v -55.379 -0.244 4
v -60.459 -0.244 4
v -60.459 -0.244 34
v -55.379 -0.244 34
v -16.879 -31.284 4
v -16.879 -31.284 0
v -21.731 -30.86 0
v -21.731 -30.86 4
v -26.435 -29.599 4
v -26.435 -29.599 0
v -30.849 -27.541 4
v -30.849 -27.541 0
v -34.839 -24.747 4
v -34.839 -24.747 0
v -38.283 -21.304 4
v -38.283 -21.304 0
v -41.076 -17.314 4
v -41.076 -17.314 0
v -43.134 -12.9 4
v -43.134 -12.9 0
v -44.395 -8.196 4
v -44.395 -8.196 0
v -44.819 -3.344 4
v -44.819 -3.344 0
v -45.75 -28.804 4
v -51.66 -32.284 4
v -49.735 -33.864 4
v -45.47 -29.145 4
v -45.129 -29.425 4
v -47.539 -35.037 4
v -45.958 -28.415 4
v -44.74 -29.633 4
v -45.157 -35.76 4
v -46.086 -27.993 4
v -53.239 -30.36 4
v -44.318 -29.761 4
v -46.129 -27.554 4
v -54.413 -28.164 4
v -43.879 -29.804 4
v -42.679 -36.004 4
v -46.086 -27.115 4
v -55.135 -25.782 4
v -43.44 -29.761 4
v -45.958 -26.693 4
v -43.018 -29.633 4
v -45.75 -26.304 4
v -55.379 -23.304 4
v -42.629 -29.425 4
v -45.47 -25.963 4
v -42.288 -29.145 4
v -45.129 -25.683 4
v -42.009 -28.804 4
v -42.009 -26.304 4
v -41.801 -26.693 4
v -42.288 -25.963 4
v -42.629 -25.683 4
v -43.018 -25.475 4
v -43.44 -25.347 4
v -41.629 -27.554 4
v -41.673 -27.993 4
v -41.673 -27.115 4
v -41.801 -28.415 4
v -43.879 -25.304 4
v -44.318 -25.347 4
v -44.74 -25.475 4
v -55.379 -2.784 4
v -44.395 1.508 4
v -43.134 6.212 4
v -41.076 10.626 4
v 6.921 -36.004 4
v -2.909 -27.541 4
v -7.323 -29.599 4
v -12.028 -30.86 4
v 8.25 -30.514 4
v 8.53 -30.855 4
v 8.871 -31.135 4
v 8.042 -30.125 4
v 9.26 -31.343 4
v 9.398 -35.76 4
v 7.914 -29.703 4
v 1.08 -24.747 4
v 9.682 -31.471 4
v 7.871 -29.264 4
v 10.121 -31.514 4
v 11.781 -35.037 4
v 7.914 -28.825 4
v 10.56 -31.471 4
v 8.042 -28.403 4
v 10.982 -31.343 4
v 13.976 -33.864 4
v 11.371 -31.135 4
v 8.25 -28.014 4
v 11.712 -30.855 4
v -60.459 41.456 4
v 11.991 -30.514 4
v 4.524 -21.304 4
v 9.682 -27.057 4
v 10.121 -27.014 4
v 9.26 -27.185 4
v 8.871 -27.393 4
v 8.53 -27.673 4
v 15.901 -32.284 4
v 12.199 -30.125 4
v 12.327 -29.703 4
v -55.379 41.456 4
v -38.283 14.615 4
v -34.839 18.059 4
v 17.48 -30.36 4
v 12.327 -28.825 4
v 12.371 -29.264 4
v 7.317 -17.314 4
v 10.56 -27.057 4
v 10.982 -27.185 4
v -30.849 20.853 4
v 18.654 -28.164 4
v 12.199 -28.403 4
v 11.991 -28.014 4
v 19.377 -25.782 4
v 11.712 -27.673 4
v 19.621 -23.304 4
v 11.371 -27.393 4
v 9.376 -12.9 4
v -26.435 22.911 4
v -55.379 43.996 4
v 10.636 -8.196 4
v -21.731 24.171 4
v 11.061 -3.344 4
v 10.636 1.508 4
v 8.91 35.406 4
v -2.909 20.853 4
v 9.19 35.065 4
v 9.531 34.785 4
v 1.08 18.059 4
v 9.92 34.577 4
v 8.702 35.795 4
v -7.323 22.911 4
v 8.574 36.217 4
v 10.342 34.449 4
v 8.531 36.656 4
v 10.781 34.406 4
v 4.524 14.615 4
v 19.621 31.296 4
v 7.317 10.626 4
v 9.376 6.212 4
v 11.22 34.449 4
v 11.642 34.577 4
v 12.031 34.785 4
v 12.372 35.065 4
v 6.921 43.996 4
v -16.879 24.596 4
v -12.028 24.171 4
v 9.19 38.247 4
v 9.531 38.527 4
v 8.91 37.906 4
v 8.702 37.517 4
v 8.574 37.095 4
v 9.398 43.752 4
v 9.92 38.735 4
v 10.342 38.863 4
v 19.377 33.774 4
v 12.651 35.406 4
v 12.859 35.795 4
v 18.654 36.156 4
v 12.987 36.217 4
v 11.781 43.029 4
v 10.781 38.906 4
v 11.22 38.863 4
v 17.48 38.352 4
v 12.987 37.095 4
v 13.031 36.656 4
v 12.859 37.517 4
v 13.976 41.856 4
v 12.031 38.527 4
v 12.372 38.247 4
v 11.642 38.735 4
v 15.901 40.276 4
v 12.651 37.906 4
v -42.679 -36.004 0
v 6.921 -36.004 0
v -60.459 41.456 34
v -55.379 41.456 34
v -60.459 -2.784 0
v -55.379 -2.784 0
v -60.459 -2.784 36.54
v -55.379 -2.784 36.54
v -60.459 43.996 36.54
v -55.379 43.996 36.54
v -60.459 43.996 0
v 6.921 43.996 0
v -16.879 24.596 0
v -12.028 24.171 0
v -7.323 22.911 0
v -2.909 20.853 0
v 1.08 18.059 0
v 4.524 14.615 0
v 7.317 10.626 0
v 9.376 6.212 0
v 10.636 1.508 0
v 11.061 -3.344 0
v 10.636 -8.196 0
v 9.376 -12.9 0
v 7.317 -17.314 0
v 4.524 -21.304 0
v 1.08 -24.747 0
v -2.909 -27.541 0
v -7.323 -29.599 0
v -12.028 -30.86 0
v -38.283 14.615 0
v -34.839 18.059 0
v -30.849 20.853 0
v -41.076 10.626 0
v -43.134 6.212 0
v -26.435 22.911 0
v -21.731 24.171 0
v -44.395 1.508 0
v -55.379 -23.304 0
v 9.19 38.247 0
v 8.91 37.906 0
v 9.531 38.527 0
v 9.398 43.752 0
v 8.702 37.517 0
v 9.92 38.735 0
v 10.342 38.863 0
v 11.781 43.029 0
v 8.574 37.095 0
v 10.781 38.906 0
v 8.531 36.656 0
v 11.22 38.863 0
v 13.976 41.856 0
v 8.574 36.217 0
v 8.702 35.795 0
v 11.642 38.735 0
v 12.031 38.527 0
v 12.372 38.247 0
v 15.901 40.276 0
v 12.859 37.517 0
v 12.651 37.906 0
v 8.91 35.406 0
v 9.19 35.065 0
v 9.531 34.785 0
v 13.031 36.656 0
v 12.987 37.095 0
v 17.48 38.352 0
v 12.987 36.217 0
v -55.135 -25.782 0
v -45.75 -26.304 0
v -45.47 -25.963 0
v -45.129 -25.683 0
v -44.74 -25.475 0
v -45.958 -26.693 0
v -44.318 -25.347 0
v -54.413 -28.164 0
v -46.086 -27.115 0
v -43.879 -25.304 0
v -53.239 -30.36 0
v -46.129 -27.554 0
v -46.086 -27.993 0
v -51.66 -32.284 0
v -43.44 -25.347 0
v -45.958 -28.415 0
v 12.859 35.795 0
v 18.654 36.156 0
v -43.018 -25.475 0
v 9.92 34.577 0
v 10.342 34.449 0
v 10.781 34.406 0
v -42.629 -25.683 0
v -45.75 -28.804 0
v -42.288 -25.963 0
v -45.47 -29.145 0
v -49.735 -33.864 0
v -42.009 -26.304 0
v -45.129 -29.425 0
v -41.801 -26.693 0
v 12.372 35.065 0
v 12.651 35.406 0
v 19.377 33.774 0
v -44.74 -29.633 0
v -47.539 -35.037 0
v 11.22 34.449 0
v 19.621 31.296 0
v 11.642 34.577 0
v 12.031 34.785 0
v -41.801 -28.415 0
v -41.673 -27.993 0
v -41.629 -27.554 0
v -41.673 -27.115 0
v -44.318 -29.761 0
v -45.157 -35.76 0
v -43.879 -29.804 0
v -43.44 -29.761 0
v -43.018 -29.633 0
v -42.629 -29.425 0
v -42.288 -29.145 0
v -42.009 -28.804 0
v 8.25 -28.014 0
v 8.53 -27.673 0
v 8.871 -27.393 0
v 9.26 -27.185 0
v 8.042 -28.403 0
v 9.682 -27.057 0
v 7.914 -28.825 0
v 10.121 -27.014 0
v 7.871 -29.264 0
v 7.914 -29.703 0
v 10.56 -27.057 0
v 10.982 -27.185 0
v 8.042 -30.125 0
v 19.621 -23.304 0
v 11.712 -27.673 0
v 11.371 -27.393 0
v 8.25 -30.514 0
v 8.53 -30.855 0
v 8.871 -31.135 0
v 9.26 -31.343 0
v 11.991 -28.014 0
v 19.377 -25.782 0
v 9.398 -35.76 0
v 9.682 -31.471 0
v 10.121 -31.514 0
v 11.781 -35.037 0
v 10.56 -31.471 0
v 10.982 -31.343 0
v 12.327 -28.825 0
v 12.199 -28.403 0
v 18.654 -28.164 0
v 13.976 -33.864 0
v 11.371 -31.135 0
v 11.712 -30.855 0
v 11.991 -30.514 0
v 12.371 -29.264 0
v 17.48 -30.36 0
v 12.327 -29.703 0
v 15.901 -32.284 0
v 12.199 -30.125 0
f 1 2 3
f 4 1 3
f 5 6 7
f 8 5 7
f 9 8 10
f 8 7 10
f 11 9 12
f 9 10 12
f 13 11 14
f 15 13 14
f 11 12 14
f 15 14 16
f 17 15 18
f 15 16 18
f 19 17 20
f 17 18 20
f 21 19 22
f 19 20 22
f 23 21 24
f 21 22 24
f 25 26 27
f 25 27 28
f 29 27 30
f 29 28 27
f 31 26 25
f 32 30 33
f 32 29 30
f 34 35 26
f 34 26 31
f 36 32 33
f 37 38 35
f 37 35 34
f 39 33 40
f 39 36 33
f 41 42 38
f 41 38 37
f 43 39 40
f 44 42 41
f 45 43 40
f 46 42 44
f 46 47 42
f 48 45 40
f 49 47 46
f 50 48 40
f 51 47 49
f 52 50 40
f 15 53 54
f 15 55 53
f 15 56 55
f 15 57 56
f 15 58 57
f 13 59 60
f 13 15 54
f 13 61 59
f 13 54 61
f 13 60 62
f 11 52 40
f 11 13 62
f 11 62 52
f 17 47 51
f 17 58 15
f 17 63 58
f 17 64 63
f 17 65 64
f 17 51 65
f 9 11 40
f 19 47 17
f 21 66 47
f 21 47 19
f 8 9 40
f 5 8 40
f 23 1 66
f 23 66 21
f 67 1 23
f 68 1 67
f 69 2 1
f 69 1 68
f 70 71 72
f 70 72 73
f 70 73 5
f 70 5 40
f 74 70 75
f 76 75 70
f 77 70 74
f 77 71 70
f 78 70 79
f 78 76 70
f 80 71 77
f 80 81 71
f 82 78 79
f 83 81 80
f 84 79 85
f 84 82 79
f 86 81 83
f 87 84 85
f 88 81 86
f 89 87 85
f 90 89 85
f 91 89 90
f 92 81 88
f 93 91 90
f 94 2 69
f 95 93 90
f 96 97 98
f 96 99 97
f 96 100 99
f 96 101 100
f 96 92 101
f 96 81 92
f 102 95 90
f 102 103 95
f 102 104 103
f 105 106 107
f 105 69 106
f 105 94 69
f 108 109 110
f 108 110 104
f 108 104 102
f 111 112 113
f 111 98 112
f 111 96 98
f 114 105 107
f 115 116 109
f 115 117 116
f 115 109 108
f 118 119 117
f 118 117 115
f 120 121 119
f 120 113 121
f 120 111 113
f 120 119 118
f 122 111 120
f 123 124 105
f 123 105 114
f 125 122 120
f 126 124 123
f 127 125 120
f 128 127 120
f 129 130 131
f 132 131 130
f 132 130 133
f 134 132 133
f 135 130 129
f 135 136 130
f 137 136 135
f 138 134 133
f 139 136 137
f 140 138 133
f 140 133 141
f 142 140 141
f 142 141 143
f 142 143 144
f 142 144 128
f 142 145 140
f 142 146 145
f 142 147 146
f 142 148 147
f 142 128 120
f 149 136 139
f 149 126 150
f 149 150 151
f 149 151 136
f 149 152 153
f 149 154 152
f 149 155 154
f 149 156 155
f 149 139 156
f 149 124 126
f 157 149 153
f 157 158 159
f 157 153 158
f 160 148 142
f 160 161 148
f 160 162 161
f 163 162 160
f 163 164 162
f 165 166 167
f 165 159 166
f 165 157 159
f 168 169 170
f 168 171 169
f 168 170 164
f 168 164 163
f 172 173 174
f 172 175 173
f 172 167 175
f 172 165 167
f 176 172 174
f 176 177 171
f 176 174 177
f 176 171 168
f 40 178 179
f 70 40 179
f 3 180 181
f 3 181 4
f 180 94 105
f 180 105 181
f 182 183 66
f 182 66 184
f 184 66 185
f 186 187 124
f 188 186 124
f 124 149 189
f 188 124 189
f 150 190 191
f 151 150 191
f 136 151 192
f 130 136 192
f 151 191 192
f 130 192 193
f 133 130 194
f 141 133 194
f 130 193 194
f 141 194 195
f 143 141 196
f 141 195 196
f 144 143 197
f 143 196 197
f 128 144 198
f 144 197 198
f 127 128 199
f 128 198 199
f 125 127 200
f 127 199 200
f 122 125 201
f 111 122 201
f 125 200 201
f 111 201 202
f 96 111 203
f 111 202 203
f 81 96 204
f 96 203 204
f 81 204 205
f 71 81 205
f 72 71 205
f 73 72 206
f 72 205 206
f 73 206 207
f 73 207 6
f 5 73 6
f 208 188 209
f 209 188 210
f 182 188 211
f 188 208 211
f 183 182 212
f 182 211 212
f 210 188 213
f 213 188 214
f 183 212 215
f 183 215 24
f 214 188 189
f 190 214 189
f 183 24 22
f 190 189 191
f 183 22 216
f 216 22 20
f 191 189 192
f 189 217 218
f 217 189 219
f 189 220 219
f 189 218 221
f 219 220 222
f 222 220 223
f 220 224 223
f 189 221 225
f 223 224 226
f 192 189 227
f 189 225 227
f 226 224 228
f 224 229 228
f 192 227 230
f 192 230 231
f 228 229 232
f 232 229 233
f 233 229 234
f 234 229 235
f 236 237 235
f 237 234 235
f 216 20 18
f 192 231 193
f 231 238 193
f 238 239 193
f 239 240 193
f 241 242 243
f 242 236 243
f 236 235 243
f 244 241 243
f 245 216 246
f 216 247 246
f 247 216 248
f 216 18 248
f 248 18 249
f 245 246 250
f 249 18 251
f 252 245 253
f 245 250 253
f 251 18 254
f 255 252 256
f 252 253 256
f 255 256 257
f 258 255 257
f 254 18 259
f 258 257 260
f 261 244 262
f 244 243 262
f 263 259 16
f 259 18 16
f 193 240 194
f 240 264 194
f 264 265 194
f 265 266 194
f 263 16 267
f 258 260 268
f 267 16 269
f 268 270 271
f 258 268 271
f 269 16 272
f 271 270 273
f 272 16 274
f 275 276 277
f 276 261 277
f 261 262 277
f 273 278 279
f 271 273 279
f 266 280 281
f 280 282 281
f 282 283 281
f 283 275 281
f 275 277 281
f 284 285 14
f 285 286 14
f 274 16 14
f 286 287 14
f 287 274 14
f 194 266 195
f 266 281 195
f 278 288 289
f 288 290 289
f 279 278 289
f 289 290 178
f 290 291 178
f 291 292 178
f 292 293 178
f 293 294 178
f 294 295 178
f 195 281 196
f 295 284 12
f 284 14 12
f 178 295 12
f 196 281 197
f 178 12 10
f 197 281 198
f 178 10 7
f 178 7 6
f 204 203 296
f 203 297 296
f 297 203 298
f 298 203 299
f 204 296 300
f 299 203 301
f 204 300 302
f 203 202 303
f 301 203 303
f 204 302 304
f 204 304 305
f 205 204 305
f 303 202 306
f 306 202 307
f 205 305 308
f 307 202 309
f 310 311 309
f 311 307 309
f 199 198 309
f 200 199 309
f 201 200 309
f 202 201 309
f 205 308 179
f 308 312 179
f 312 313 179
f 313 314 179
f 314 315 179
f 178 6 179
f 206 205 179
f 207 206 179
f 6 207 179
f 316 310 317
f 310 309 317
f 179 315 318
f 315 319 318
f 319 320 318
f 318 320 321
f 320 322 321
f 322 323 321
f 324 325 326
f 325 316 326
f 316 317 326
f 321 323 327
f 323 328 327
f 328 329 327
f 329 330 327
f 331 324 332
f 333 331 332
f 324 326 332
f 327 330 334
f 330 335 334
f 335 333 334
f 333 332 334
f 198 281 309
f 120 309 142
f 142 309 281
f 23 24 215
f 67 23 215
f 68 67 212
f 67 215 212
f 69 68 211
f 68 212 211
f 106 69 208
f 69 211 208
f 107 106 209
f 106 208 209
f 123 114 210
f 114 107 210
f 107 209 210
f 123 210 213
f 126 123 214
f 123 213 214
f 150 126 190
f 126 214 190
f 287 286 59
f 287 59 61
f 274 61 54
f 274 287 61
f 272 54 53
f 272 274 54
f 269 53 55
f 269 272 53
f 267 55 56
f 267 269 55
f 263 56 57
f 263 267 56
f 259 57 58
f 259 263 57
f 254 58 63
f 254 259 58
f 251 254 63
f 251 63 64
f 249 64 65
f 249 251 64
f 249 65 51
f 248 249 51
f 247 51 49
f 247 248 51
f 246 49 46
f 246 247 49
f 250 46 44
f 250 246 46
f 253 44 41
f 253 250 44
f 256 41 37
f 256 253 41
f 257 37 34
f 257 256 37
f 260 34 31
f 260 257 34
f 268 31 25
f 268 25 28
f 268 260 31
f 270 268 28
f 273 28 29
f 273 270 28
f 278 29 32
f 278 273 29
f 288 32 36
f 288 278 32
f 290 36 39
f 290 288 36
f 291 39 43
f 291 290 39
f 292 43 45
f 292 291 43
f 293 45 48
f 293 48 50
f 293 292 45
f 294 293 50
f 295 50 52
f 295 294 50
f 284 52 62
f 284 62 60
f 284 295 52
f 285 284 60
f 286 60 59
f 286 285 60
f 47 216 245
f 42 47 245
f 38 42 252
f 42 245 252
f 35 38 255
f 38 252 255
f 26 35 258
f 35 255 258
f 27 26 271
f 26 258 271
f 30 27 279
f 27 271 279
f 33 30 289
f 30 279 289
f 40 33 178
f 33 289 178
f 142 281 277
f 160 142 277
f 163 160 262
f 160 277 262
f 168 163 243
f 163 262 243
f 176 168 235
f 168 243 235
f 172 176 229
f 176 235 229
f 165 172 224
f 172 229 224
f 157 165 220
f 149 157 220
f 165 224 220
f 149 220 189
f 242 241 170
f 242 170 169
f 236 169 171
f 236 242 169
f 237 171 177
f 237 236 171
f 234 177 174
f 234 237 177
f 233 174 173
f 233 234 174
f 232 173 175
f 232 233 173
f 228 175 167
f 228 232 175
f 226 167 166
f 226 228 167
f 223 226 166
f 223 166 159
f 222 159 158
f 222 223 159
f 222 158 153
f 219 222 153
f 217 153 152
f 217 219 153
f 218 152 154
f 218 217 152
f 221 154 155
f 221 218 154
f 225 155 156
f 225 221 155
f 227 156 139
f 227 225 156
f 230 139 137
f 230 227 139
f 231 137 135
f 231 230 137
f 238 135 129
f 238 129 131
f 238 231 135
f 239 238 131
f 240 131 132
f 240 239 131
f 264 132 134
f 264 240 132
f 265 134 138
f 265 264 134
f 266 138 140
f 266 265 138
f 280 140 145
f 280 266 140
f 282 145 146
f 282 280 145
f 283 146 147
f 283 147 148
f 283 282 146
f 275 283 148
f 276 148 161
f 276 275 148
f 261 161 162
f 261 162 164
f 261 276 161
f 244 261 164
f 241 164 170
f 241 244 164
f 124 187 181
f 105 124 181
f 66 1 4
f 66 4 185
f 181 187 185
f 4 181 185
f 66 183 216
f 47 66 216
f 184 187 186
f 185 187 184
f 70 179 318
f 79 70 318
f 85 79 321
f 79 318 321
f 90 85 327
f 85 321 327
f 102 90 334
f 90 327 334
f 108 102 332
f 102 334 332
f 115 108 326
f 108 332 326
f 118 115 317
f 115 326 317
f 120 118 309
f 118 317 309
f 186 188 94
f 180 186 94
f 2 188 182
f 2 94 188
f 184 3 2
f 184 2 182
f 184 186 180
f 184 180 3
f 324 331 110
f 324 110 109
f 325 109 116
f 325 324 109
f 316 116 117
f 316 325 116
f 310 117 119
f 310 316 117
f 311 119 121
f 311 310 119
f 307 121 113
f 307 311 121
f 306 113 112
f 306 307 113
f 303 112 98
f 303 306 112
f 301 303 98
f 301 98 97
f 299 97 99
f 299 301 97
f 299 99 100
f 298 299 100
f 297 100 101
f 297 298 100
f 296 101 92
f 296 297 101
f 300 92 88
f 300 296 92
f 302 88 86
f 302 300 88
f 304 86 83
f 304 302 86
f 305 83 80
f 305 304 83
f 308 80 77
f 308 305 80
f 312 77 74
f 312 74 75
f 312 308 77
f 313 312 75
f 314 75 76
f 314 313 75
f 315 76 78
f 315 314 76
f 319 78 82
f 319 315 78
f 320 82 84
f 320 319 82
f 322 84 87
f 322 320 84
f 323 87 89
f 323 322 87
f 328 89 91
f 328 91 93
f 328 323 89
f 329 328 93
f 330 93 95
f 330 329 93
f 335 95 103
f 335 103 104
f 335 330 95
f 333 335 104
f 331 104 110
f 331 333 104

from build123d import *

# Parameters (mm, degrees)
F1_R     = 2.25
F2_DEPTH = 4
F3_W     = 46.78
F3_H     = 4
F3_H_2   = 32.54
F4_DEPTH = 5.08
F5_W     = 41.7
F5_H     = 30
F6_DEPTH = 25.4


with BuildPart() as f2:
    # F1 (on Top) → F2 (new body)
    with BuildSketch(Plane.XY):
        with BuildLine():
            Line((6.9206423996, 43.995959647), (-16.8793576004, 43.995959647))
            Line((-16.8793576004, 43.995959647), (-16.8793576004, 24.595959647))
            ThreePointArc((-16.8793576004, 24.595959647), (2.8772058659, 16.4125231134), (11.0606423996, -3.344040353))
            Line((11.0606423996, -3.344040353), (19.6206423996, -3.344040353))
            Line((19.6206423996, -3.344040353), (19.6206423996, 31.295959647))
            ThreePointArc((19.6206423996, 31.295959647), (15.9008985206, 40.2762157681), (6.9206423996, 43.995959647))
        make_face()
        with Locations((10.7806423996, 36.655959647)):
            Circle(F1_R, mode=Mode.SUBTRACT)
        with BuildLine():
            Line((19.6206423996, -3.344040353), (11.0606423996, -3.344040353))
            ThreePointArc((11.0606423996, -3.344040353), (2.8772058659, -23.1006038194), (-16.8793576004, -31.284040353))
            Line((-16.8793576004, -31.284040353), (-16.8793576004, -36.004040353))
            Line((-16.8793576004, -36.004040353), (6.9206423996, -36.004040353))
            ThreePointArc((6.9206423996, -36.004040353), (15.9008985206, -32.2842964741), (19.6206423996, -23.304040353))
            Line((19.6206423996, -23.304040353), (19.6206423996, -3.344040353))
        make_face()
        with Locations((10.1206423996, -29.264040353)):
            Circle(F1_R, mode=Mode.SUBTRACT)
        with BuildLine():
            Line((-44.8193576004, -3.344040353), (-55.3793576004, -3.344040353))
            Line((-55.3793576004, -3.344040353), (-55.3793576004, -23.304040353))
            ThreePointArc((-55.3793576004, -23.304040353), (-51.6596137215, -32.2842964741), (-42.6793576004, -36.004040353))
            Line((-42.6793576004, -36.004040353), (-16.8793576004, -36.004040353))
            Line((-16.8793576004, -36.004040353), (-16.8793576004, -31.284040353))
            ThreePointArc((-16.8793576004, -31.284040353), (-36.6359210668, -23.1006038194), (-44.8193576004, -3.344040353))
        make_face()
        with Locations((-43.8793576004, -27.554040353)):
            Circle(F1_R, mode=Mode.SUBTRACT)
        with BuildLine():
            Line((-16.8793576004, 43.995959647), (-55.3793576004, 43.995959647))
            Line((-55.3793576004, 43.995959647), (-55.3793576004, -3.344040353))
            Line((-55.3793576004, -3.344040353), (-44.8193576004, -3.344040353))
            ThreePointArc((-44.8193576004, -3.344040353), (-36.6359210668, 16.4125231134), (-16.8793576004, 24.595959647))
            Line((-16.8793576004, 24.595959647), (-16.8793576004, 43.995959647))
        make_face()
    extrude(amount=F2_DEPTH)

    # F3 (on face) → F4 (join)
    with BuildSketch(Plane(origin=(-55.3793576004, 0, 0), x_dir=(0, -1, 0), z_dir=(-1, 0, 0))):
        with Locations((-20.605959647, 2)):
            Rectangle(F3_W, F3_H)
        with Locations((-20.605959647, 20.27)):
            Rectangle(F3_W, F3_H_2)
    extrude(amount=F4_DEPTH)

    # F5 (on face) → F6 (cut)
    with BuildSketch(Plane(origin=(-60.4593576004, 0, 0), x_dir=(0, -1, 0), z_dir=(-1, 0, 0))):
        with Locations((-20.605959647, 19)):
            Rectangle(F5_W, F5_H)
    extrude(amount=-F6_DEPTH, mode=Mode.SUBTRACT)


solid = f2.part
